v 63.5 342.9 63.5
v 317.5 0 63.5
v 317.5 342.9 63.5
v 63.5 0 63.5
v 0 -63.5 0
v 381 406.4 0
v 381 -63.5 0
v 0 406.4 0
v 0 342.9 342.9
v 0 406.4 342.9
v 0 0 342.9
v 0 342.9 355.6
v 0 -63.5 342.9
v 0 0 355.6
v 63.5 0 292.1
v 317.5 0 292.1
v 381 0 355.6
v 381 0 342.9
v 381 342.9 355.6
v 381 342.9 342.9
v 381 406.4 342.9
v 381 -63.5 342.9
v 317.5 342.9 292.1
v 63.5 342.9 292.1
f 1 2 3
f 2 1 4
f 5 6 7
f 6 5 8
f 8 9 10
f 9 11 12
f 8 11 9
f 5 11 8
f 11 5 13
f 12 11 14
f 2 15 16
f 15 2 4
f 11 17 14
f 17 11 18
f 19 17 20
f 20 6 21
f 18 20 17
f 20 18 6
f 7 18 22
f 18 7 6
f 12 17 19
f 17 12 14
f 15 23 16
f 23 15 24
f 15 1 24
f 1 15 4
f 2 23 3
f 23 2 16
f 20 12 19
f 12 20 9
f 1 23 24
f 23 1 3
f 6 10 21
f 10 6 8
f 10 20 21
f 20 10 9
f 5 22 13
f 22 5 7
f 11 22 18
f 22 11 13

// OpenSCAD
$fn = 180;

in2mm = 25.4;

stdBrick = [4.5*in2mm,9*in2mm,2.5*in2mm];
vol = [10*in2mm, 13.5*in2mm, 9*in2mm];

module brick(x=stdBrick.x, y=stdBrick.y, z=stdBrick.z)
{
    cube([x,y,z]);
}

// currently 30 bricks needed.


//base = 4
brick();
translate([stdBrick.x,0,0])brick();
translate([stdBrick.x*2,0,0])brick();
translate([stdBrick.x*3,0,0])brick(x=1.5*in2mm);
//cut off 1.5" from a block, leaving a remainder block of 3"
//color("red")translate([stdBrick.x*3+in2mm*1.5,0,0])brick(stdBrick.x-in2mm*1.5, y=stdBrick.y, z=stdBrick.z);

//top = 4
translate([0,0,stdBrick.z+vol.z])brick();
translate([stdBrick.x,0,stdBrick.z+vol.z])brick();
translate([stdBrick.x*2,0,stdBrick.z+vol.z])brick();
translate([stdBrick.x*3,0,stdBrick.z+vol.z])brick(x=1.5*in2mm);
//cut off 1.5" from a block, leaving a remainder block of 3"
//color("red")translate([stdBrick.x*3+in2mm*1.5,0,0])brick(stdBrick.x-in2mm*1.5, y=stdBrick.y, z=stdBrick.z);

//left side = 2
translate([stdBrick.z,0,stdBrick.z])rotate([0,-90,0])brick();
translate([stdBrick.z,0,stdBrick.z+stdBrick.x])rotate([0,-90,0])brick();

//right side = 2
translate([vol.x+stdBrick.z*2,0,stdBrick.z])rotate([0,-90,0])brick();
translate([vol.x+stdBrick.z*2,0,stdBrick.z+stdBrick.x])rotate([0,-90,0])brick();

//back extension base = 2
translate([0,stdBrick.y+stdBrick.x,0])rotate([0,0,-90])brick();
translate([stdBrick.y,stdBrick.y+stdBrick.x,0])rotate([0,0,-90])brick(x=stdBrick.x, y=stdBrick.y-in2mm*3);
//back extension top = 2
translate([0,stdBrick.y+stdBrick.x,stdBrick.z+vol.z])rotate([0,0,-90])brick();
translate([stdBrick.y,stdBrick.y+stdBrick.x,stdBrick.z+vol.z])rotate([0,0,-90])brick(x=stdBrick.x, y=stdBrick.y-in2mm*3);
//back extension sides = 2
translate([stdBrick.z,stdBrick.y+stdBrick.x,stdBrick.z])rotate([90,0,-90])brick();
translate([stdBrick.z*2+vol.x,stdBrick.y+stdBrick.x,stdBrick.z])rotate([90,0,-90])brick();


//back wall = 6
translate([0,vol.y,0])rotate([0,-90,-90])brick();
translate([stdBrick.y,vol.y,0])rotate([0,-90,-90])brick(x=stdBrick.x, y=stdBrick.y-in2mm*3);
translate([0,vol.y,stdBrick.x])rotate([0,-90,-90])brick();
translate([stdBrick.y,vol.y,stdBrick.x])rotate([0,-90,-90])brick(x=stdBrick.x, y=stdBrick.y-in2mm*3);
translate([0,vol.y,stdBrick.x*2])rotate([0,-90,-90])brick();
translate([stdBrick.y,vol.y,stdBrick.x*2])rotate([0,-90,-90])brick(x=stdBrick.x, y=stdBrick.y-in2mm*3);


//front wall = 6
translate([0,-stdBrick.z,0])rotate([0,-90,-90])brick();
translate([stdBrick.y,-stdBrick.z,0])rotate([0,-90,-90])brick(x=stdBrick.x, y=stdBrick.y-in2mm*3);
translate([0,-stdBrick.z,stdBrick.x])rotate([0,-90,-90])brick();
translate([stdBrick.y,-stdBrick.z,stdBrick.x])rotate([0,-90,-90])brick(x=stdBrick.x, y=stdBrick.y-in2mm*3);
translate([0,-stdBrick.z,stdBrick.x*2])rotate([0,-90,-90])brick();
translate([stdBrick.y,-stdBrick.z,stdBrick.x*2])rotate([0,-90,-90])brick(x=stdBrick.x, y=stdBrick.y-in2mm*3);


//translate([stdBrick.z,0,stdBrick.z])color("green")cube(vol);
